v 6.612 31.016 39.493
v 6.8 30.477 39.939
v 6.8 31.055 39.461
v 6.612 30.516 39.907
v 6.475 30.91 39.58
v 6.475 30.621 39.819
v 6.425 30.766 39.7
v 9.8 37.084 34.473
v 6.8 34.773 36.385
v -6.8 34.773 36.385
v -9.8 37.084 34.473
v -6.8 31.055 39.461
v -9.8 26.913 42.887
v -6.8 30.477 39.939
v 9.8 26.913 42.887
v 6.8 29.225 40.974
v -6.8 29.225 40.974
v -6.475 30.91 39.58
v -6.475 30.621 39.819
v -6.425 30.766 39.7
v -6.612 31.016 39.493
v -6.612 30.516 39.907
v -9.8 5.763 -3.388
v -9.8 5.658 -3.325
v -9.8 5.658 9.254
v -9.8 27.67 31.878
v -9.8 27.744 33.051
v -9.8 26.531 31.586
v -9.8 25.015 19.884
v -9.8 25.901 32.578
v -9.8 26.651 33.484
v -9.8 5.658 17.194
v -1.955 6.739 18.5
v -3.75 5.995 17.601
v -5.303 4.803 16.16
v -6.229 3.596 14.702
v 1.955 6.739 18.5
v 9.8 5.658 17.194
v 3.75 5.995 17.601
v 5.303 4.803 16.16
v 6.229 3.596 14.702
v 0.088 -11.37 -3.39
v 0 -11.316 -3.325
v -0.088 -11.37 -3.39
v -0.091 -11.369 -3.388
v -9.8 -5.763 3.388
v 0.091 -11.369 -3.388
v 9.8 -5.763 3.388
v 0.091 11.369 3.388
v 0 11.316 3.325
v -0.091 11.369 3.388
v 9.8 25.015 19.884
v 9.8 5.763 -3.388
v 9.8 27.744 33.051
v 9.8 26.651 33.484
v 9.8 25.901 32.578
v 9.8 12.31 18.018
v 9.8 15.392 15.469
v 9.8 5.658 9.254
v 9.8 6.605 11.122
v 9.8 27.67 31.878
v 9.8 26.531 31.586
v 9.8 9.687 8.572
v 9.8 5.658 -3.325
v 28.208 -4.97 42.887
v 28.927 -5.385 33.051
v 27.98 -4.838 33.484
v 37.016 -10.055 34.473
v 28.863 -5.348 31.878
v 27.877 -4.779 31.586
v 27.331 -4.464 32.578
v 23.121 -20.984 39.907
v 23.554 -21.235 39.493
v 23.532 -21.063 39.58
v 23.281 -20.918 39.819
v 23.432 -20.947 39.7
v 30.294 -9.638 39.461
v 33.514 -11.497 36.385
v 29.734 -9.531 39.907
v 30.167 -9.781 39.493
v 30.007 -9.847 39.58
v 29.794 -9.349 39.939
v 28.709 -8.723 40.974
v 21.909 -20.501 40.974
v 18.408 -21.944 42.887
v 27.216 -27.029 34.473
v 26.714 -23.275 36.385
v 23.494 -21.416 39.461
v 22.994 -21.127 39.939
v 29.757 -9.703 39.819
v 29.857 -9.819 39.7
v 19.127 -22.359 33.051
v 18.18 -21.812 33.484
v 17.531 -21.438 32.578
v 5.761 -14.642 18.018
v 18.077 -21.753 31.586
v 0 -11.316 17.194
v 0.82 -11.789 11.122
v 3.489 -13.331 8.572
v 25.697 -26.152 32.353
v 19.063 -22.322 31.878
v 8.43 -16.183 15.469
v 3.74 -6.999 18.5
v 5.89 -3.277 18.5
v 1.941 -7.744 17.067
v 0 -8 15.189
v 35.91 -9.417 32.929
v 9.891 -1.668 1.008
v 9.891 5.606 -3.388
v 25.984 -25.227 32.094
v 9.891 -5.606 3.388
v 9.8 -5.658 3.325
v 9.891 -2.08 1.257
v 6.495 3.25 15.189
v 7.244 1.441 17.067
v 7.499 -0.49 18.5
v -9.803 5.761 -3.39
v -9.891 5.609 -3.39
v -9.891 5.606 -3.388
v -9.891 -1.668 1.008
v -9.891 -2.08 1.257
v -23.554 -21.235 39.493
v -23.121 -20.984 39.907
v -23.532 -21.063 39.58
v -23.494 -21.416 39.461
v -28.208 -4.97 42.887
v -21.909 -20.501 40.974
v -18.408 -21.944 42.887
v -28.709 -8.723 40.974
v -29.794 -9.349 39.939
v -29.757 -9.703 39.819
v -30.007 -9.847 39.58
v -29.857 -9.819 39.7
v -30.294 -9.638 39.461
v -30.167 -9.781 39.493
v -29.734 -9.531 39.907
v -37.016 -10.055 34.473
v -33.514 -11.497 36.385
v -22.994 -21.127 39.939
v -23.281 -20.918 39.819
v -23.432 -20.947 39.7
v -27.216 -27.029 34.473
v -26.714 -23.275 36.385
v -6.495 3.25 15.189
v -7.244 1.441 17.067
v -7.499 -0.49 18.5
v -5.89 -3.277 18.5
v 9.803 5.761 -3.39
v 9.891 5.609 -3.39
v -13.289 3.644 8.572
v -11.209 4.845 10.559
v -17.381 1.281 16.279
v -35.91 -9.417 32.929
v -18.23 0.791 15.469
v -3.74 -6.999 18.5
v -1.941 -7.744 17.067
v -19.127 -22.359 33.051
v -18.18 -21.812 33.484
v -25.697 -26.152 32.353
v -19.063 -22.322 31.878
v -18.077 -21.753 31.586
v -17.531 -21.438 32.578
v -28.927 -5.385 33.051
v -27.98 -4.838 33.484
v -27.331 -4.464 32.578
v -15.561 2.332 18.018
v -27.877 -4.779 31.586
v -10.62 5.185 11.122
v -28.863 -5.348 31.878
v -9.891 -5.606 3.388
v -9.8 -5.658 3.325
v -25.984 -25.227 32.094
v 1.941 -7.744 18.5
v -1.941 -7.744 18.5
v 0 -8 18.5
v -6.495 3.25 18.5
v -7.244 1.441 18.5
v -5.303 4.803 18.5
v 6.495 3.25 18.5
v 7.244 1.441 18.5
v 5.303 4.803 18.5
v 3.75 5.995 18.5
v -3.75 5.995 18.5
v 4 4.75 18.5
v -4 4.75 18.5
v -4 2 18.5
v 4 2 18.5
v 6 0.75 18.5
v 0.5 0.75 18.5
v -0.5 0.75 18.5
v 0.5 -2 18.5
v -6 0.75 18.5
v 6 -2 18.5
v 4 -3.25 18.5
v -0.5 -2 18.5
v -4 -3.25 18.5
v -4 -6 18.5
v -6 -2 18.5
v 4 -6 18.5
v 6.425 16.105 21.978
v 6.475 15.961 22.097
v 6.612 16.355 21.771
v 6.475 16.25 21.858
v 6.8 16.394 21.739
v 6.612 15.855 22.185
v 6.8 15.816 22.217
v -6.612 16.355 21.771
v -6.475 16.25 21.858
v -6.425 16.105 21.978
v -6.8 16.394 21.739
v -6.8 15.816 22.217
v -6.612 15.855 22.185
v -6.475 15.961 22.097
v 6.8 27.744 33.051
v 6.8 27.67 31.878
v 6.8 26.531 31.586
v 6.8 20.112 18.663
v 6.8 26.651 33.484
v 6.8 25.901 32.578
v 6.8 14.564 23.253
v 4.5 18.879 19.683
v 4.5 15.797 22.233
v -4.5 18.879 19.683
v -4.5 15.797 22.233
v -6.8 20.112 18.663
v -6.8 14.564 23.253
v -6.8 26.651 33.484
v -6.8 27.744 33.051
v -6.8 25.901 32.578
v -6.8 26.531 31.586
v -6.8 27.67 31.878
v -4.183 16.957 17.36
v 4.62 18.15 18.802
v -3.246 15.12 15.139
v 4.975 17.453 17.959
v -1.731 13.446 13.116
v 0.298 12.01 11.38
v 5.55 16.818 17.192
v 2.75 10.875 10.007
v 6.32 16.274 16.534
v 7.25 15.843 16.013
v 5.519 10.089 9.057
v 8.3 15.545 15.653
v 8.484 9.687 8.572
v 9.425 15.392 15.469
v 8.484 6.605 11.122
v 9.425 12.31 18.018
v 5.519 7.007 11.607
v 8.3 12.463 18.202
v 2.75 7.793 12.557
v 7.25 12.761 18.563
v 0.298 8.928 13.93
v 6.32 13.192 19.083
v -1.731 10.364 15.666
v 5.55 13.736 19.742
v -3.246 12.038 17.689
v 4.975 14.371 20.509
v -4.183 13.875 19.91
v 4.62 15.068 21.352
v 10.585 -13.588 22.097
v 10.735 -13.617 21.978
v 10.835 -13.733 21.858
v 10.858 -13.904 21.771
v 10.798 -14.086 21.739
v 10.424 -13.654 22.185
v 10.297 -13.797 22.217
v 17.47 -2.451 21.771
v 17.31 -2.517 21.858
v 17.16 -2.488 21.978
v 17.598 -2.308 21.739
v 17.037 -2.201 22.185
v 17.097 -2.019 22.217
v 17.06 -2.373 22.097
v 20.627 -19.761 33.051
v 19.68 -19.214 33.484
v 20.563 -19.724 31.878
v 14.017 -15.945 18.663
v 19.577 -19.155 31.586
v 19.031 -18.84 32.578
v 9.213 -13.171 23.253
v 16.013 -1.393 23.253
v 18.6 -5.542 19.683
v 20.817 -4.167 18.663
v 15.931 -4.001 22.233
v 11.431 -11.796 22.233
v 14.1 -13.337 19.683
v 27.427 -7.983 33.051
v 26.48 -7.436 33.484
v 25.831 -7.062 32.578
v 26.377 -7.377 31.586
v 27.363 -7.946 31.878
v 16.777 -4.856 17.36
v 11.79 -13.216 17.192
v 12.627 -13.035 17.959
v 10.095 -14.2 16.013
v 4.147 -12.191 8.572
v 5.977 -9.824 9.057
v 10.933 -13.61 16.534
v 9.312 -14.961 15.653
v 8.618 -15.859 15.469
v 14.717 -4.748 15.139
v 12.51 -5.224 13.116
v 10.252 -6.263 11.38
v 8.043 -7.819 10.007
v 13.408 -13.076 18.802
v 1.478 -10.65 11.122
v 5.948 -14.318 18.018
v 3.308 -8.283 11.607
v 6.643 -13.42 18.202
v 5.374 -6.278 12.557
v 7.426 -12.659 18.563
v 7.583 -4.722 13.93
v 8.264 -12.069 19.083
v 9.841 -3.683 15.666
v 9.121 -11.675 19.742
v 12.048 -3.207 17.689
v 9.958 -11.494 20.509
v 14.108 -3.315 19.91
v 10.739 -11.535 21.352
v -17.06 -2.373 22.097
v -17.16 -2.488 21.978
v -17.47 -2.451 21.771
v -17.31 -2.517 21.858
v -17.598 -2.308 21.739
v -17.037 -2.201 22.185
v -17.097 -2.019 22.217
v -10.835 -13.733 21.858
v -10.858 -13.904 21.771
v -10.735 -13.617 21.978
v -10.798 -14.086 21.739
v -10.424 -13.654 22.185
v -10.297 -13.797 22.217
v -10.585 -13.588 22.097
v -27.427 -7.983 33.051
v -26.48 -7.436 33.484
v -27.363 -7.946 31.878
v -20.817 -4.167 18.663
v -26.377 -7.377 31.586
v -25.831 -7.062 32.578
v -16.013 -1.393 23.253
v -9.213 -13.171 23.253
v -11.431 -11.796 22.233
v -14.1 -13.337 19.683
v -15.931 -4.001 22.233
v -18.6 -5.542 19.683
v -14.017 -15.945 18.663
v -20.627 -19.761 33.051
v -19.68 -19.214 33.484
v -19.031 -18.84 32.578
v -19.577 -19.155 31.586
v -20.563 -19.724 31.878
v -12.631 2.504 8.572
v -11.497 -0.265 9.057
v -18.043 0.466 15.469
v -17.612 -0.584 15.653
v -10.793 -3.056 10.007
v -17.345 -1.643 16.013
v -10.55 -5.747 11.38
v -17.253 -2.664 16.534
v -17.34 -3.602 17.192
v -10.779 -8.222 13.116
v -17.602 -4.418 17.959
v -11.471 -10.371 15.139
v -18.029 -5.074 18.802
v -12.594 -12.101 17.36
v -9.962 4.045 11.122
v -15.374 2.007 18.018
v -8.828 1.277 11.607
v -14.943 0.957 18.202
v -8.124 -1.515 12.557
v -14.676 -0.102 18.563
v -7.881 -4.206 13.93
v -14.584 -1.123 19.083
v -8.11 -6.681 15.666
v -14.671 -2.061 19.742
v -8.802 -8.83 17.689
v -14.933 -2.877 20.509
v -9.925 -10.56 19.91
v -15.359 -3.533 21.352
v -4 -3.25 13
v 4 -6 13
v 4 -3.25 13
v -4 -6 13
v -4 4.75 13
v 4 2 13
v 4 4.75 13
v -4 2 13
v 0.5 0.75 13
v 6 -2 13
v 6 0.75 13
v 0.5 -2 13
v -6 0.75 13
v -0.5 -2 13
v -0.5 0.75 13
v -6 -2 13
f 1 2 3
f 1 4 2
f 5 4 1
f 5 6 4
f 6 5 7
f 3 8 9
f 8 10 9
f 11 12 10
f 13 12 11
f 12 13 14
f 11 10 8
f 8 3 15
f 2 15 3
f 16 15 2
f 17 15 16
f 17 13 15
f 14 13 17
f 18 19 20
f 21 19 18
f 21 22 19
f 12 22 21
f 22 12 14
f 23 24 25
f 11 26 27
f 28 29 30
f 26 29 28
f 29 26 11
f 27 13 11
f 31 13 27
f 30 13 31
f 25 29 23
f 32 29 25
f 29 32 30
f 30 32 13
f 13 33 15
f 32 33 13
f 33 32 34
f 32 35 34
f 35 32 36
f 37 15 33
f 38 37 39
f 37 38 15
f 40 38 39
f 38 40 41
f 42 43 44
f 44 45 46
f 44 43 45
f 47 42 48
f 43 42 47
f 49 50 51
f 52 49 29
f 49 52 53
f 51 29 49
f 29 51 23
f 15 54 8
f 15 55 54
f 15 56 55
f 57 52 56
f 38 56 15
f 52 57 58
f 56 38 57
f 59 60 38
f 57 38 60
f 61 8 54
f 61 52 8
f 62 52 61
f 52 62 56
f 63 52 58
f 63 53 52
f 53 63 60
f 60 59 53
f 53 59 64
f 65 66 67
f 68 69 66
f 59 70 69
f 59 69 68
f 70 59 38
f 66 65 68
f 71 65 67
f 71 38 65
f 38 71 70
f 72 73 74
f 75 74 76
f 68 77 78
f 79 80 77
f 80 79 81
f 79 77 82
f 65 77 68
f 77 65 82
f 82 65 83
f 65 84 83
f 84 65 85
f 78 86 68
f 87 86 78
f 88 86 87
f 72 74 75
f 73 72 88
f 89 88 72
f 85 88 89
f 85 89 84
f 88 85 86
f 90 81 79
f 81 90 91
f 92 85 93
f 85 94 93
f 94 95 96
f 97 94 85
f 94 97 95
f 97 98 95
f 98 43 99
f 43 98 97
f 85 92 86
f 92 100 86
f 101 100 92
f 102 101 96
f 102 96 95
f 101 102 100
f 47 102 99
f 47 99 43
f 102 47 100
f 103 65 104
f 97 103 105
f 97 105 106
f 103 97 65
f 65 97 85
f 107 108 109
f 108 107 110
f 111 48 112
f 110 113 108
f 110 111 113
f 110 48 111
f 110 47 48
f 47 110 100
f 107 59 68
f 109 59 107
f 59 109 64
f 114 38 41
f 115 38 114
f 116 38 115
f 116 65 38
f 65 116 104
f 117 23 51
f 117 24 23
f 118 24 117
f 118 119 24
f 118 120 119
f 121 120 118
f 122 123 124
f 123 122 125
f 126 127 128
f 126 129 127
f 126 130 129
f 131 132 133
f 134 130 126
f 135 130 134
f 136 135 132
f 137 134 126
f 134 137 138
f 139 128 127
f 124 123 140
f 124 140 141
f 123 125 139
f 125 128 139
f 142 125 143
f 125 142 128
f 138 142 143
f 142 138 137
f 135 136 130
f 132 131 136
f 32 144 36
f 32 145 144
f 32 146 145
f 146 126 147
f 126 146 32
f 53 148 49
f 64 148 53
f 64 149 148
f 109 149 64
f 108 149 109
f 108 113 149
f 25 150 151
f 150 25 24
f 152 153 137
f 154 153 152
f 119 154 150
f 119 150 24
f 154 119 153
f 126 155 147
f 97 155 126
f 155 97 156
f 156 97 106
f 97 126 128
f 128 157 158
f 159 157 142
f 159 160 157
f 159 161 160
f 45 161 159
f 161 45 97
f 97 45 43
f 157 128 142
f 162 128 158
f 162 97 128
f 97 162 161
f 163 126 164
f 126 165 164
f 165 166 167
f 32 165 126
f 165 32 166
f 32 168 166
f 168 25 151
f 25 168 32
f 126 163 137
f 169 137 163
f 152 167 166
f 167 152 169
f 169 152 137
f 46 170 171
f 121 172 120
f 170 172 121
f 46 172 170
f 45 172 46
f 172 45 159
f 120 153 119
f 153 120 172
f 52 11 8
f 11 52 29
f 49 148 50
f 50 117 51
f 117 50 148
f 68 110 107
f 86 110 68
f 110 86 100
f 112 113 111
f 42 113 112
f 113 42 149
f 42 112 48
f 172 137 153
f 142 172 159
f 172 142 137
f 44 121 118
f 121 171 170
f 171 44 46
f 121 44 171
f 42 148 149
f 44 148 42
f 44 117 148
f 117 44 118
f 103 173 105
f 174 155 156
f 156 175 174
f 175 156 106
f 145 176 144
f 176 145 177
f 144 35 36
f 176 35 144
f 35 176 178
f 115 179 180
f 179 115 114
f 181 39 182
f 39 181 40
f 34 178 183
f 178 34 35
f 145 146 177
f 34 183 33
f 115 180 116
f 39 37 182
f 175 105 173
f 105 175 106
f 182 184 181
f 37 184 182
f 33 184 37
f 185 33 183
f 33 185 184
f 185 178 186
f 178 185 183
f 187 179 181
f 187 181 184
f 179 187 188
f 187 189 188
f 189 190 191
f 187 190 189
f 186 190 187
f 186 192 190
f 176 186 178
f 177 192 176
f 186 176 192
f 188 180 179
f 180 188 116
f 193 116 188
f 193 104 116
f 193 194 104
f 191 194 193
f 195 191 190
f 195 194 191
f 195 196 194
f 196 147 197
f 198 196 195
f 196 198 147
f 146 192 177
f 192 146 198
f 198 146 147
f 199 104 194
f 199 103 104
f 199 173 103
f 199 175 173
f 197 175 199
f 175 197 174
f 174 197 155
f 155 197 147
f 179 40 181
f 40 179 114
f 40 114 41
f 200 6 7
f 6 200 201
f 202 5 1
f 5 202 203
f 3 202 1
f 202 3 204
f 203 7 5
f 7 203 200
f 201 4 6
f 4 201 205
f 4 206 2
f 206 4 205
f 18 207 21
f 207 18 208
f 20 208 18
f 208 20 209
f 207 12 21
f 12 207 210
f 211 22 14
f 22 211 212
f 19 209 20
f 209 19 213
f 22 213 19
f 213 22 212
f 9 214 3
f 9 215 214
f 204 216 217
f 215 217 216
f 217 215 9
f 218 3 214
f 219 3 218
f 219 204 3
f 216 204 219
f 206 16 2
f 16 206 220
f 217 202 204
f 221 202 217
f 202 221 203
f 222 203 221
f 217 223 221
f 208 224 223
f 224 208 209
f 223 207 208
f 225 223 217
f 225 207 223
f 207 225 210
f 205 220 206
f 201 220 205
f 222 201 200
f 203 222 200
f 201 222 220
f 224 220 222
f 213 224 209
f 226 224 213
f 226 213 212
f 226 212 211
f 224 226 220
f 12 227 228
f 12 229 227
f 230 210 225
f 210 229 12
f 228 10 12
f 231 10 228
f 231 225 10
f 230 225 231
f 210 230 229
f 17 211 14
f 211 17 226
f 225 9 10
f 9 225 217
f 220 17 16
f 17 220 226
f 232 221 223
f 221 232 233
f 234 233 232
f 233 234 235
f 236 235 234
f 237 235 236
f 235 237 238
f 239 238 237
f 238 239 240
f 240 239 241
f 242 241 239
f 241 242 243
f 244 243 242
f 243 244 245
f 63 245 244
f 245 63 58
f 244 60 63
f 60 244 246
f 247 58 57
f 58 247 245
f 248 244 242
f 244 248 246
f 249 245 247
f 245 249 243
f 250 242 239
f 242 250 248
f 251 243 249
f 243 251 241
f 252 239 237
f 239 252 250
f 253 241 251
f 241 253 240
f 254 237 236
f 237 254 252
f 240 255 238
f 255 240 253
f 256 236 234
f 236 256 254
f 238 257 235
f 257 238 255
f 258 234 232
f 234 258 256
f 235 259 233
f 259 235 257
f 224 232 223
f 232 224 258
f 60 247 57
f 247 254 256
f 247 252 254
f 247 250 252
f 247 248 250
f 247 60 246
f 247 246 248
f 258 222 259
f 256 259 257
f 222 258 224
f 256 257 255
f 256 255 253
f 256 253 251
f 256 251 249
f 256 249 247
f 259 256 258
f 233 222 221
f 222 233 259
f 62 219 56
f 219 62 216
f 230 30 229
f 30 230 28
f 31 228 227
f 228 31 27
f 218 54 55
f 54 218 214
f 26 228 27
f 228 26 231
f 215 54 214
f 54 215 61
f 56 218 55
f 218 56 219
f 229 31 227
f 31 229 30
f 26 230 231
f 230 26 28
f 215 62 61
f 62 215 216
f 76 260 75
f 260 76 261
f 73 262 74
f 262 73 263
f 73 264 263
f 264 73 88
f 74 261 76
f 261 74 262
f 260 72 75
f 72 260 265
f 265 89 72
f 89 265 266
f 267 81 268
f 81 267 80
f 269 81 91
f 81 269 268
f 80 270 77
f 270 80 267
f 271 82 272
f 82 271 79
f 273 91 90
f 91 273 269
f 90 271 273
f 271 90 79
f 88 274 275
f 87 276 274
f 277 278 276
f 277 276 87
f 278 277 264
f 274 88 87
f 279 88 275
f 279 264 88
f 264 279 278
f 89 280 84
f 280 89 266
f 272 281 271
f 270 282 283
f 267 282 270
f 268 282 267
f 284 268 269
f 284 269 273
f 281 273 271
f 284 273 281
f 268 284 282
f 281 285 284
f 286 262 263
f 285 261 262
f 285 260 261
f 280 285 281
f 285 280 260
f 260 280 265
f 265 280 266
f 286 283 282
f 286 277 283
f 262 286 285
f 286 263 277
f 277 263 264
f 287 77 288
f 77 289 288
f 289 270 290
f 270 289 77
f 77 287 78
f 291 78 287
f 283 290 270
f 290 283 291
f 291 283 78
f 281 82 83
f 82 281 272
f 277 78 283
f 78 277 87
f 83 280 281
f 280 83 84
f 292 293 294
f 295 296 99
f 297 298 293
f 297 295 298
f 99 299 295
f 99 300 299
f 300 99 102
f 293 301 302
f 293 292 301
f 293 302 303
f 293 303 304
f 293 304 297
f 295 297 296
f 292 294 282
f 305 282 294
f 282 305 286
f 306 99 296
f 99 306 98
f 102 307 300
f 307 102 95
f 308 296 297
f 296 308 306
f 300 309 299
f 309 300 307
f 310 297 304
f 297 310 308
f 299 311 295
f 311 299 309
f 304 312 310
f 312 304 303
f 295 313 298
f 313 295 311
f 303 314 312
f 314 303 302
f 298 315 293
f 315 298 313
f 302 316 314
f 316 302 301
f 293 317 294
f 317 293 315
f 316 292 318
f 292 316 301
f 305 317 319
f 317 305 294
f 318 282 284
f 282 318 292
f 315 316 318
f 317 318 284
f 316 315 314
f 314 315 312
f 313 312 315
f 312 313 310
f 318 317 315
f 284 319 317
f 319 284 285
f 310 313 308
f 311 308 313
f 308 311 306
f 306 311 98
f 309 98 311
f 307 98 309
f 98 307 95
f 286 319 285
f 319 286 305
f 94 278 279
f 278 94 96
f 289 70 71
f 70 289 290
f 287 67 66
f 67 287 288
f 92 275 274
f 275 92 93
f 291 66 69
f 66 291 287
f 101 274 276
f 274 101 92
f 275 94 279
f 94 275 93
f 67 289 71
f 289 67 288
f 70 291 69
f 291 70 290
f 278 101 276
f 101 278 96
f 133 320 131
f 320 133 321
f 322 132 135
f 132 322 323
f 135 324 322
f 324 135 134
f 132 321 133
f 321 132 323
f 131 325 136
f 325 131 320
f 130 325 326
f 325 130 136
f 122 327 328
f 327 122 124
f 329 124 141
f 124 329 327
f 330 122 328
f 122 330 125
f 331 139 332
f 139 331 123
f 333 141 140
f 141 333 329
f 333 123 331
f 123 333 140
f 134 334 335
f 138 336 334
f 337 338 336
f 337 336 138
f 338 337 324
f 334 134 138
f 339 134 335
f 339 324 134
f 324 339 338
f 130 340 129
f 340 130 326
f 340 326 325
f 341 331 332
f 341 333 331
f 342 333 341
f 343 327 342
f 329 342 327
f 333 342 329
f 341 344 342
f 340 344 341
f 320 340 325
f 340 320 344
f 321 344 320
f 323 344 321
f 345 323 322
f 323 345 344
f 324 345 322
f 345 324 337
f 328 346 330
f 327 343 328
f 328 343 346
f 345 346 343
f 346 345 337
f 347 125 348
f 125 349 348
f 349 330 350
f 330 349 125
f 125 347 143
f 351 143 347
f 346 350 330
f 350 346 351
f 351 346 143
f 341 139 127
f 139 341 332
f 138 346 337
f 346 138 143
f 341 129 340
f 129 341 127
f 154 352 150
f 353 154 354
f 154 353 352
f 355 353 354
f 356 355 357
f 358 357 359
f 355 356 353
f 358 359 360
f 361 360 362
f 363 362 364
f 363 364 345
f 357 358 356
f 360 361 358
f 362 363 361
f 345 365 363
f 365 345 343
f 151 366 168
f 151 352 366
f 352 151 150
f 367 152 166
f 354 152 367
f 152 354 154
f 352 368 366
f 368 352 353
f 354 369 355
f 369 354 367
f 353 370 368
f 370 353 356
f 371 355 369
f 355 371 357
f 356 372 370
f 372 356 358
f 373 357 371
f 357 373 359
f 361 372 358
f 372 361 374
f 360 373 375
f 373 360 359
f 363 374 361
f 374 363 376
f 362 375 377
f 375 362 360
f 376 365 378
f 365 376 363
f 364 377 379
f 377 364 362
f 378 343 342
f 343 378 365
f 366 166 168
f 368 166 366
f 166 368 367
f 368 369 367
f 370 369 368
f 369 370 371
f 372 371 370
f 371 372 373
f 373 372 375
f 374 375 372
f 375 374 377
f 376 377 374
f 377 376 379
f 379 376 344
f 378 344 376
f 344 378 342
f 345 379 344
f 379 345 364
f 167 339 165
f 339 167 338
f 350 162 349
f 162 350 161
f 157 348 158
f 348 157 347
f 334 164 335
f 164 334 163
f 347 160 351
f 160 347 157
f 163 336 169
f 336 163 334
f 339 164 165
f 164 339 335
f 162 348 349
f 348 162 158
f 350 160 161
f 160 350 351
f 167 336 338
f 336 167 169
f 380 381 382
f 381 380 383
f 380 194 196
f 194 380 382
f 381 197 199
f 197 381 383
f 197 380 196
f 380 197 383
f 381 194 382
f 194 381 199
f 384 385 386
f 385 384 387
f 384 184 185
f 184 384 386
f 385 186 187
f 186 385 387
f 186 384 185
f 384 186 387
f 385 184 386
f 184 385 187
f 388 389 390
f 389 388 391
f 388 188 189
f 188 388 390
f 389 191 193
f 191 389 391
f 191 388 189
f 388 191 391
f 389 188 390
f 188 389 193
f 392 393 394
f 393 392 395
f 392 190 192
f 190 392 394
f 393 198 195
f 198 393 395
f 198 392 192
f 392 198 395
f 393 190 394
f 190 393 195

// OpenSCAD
bend = 50.4;
r = 37/2;
d = 75;

l = 40;
w = 13.6;
h = 7.2;
thick = 3;

oL = l+2*thick;
oW = w+2*thick;
oH = h+2*thick;

rotate([180,0,0]) vertex_d3();
//vertex_f2u1();
//rotate([bend+180,0,0]) vertex_f2u1d3();
//vertex_f4u2();

//single();
//test();

module test() {
    truncate_z(from=20, to=40, floor = true)
        difference() {
            connect();
            connect_hole();
        }
            
        
    translate([-30,0,0]) truncate_z(from=-10, to=0, floor = true) rotate([0,90,0]) difference() {
        wiring_panel();
        wiring_panel_hole();
    }
}

module single() {
    difference() {
        //connect();
        connect_hole(wireAng = 30, wireR = 60);
    }
}

module vertex_d3() {
    difference() {
        union() {
            intersection() {
                // Connectors with overhang to feed to the shear
                union() {
                    angs_d3() connect(overhang=18);
                }

                // Shearing planes to tidy things up
                intersection_for(ang=[0,120,240]) rotate([90+bend,0,ang]) connect_plane_top();

                translate([0,0,-200 + 3.39]) cube(400, center=true);
            }


//            translate([0,0,1.59]) scale([1,1,-1])
//                linear_extrude(height=14, scale=.3)
//                    polygon([[0,14], [-12.4,-7.2], [12.4,-7.2]]);

            translate([0,8,-18.5]) rotate([90,-90,0])
                wiring_panel(size="small", shape="circle");
        }
        angs_d3() connect_hole(wireAng = 90, wireR = 10);
        translate([0,8,-18.5]) rotate([90,-90,0])
            wiring_panel_hole(size="small");
        
//        translate([0,0,2]) scale([1,1,-1]) cylinder(r=7.5, h=15);
   
 }
}

module vertex_f2u1() {
    difference() {
        union() {
            
            intersection() {
                // Connectors with overhang to feed to the shear
                union() {
                    angs_f2u1() connect(overhang=18);
                }

                // Shearing planes to tidy things up
                rotate([90,0,30]) connect_plane_right();
                scale([-1,1,1]) rotate([90,0,30]) connect_plane_right();
                for(ang=[0]) rotate([90-bend,0,ang])
                    connect_plane_top();
                rotate([90,0,30]) connect_plane_bottom();
            }
            
            rotate([0,90-bend,270]) translate([-8.5,0,8])
                wiring_panel(size="small");
        }

        // Break out connect holes so that cable management can be customised
        for(ang=[30], mirror=[1,-1]) scale([mirror,1,1]) rotate([90,0,ang])
            connect_hole(wireAng =40);
        for(ang=[0]) rotate([90-bend,0,ang]) connect_hole();

        rotate([0,90-bend,270]) translate([-8.5,0,8])
                wiring_panel_hole(size="small");
        translate([0,6,0]) cube([9,20,4], center=true);
    }
}


module vertex_f4u2() {
    difference() {
        union() {
            angs_f4u2() connect();
            rotate([90,0,0]) connect_join();
            translate([-oW/2-.5,0,oH/2]) rotate([0,20,0]) wiring_panel(height=17);
        }

        // Break out connect holes so that cable management can be customised
        union() {
            for(mirror=[1,-1], ang=[120,180])
                scale([1,mirror,1]) rotate([90,0,ang])
                    connect_hole(
                        wireAng = ang-90,
                        wireR = (ang==120) ? 60 : 10
                  );
            for(mirror=[1,-1], ang=[150])
                scale([1,mirror,1]) rotate([90-bend,0,ang])
                    connect_hole(wireAng = 77, wireR = 10);
        }
        
        //translate([0,0,0]) cube([20,15,10], center=true);

        translate([-oW/2-.5,0,oH/2+2]) rotate([0,20,0]) wiring_panel_hole(height=17);
    }
}

module vertex_f2u1d3() {
    difference() {
        union() {
            angs_f2u1d3() connect(nudge = 2.2);
             rotate([90,bend,90]) connect_join();
             rotate([-bend,0,0]) rotate([0,90,0]) translate([-6.6,0,-8])
                wiring_panel();
        }

        rotate([-bend,0,0]) rotate([0,90,0]) translate([-6.6,0,-8])
            wiring_panel_hole();

        // Break out connect holes so that cable management can be customised
        union() {
            for(mirror=[1,-1])
                scale([mirror,1,1]) rotate([90,0,30]) connect_hole(wireAng=60);
            for(ang=[0]) rotate([90-bend,0,ang]) connect_hole(wireAng = 90, wireR = 10);
            for(ang=[60,180,300]) rotate([90+bend,0,ang]) connect_hole(wireAng = 90, wireR = 12);
        }

        //rotate([0,bend,90]) translate([0,0,3])  cube([20,15,16], center=true);
   }
}

module angs_d3() {
    for(ang=[0,120,240]) rotate([90+bend,0,ang]) children();
}

module angs_f2u1() {
    for(ang=[-30,30]) rotate([90,0,ang]) children();
    for(ang=[0]) rotate([90-bend,0,ang]) children();
}

module angs_f4u2() {
    for(mirror=[1,-1], ang=[120,180])
        scale([1,mirror,1]) rotate([90,0,ang])
            children();
    for(mirror=[1,-1], ang=[150])
        scale([1,mirror,1]) rotate([90-bend,0,ang])
            children();
}

module angs_f2u1d3() {
    union() {
        for(mirror=[1,-1])
            scale([mirror,1,1]) rotate([90,0,30]) children();
        for(ang=[0]) rotate([90-bend,0,ang]) children();
        for(ang=[60,180,300]) rotate([90+bend,0,ang]) children();
    }
}

module connect_down() {
    rotate([90+bend,0,0]) connect();
}

module connect_flat() {
    rotate([90,0,0]) connect();
}

module connect_up() {
    rotate([90-bend,0,0]) connect();
}

// Outer shape for each bar of the connector
module connect(nudge = 0, overhang = 0) {
    translate([0,0,l/2+h-nudge -overhang/2 ]) cube([w+2*thick,h+2*thick,l+2*thick+overhang], center=true);
}

// Shearing plane to be used with intersection
module connect_plane_right() {
    translate([-150 + oW/2,0,0]) cube(300,center=true);
}

module connect_plane_top() {
    translate([0,-150 + oH/2,0]) cube(300,center=true);
}
module connect_plane_bottom() {
    translate([0,150 - oH/2,0]) cube(300,center=true);
}

// Cutaway shape for each bar of the connector
module connect_hole(wireAng = 0, wireR = 16) {
    wireW = 9;
    wireH = 4;
    
    holeHeight = 20;
    
    union() {
        difference() {
            translate([0,0, l/2+h + holeHeight]) cube([w,h,l], center=true);
            for(mirrorX = [1,-1])
                translate([mirrorX*w/2,-h/2+2,0])
                    cylinder(d=0.75,h=l*2,$fs=.2);
        }
        
        // Screw hole
        translate([0,0,l+h-5]) rotate([90,0,90]) cylinder(h=20,r=1,center=true);
        
        // Bent cable channel
        if(wireAng) {
            intersection() {
                translate([wireR,0,h + holeHeight]) rotate([90,0,0])
                    square_ring(r= wireR, h = wireH, w = wireW);
                 translate([wireR,0,h + holeHeight])
                        rotate([0,-wireAng,0])
                            translate([0,0,100])
                                cube([300,h,200], center=true);
                translate([0,0,(h+holeHeight)/2 - 100])
                    cube([300,h,h + holeHeight + 200], center=true);
            }
        }
        
        rotate_about(center=[wireR,0,h + holeHeight],ang=[0,-wireAng,0])
            translate([0,0,(h+holeHeight) /2])
                cube([wireW,wireH,h + holeHeight], center=true);
    }
}
// Join piece to use at the vetext
module connect_join() {
    cube([w+2*thick,h+2*thick,w+2*thick], center=true);
}

module square_ring(r, w, h) {
    rotate_extrude()
        translate([r,0])
            square([w,h], center=true);
}


module wiring_panel(length=15, height=15, size="large") {
    if(size == "large") {
        translate([0,-12,0]) cube([length,24,height]);
    } else {
        if(shape == "circle") {
            translate([0,0,height/2]) rotate([0,90,0]) cylinder(d=height, h=length);
        } else {
            translate([0,-8,0]) cube([length,16,height]);
        }
    }
}

module wiring_panel_hole(size="large") {
    union() {
        if(size == "large") {
            translate([-1,-8,2]) cube([6.5,15.5,2.75]);
            translate([-1,-8,10]) cube([6.5,15.5,2.75]);
            translate([-1,-10,6]) cube([6.5,5.5,2.75]);
            translate([-1,-3,6]) cube([6.5,5.5,2.75]);
            translate([-1,4,6]) cube([6.5,5.5,2.75]);
        } else {
            translate([-1,-4,2]) cube([6.5,8,2.75]);
            translate([-1,-4,10]) cube([6.5,8,2.75]);
            translate([-1,-6,6]) cube([6.5,5.5,2.75]);
            translate([-1,.5,6]) cube([6.5,5.5,2.75]);
        }
    }
}
// Rotate about a given center point
module rotate_about(center, ang) {
     translate(center) rotate(ang) translate(-center)
        children();
}

// limit shape to a given z range
module truncate_z(from, to, floor = false) {
    translate([0,0, floor ? -from : 0]) 
        intersection() {
            translate([-1000,-1000,from]) cube([2000,2000,to-from]);
            union() { children(); }
        }
}
